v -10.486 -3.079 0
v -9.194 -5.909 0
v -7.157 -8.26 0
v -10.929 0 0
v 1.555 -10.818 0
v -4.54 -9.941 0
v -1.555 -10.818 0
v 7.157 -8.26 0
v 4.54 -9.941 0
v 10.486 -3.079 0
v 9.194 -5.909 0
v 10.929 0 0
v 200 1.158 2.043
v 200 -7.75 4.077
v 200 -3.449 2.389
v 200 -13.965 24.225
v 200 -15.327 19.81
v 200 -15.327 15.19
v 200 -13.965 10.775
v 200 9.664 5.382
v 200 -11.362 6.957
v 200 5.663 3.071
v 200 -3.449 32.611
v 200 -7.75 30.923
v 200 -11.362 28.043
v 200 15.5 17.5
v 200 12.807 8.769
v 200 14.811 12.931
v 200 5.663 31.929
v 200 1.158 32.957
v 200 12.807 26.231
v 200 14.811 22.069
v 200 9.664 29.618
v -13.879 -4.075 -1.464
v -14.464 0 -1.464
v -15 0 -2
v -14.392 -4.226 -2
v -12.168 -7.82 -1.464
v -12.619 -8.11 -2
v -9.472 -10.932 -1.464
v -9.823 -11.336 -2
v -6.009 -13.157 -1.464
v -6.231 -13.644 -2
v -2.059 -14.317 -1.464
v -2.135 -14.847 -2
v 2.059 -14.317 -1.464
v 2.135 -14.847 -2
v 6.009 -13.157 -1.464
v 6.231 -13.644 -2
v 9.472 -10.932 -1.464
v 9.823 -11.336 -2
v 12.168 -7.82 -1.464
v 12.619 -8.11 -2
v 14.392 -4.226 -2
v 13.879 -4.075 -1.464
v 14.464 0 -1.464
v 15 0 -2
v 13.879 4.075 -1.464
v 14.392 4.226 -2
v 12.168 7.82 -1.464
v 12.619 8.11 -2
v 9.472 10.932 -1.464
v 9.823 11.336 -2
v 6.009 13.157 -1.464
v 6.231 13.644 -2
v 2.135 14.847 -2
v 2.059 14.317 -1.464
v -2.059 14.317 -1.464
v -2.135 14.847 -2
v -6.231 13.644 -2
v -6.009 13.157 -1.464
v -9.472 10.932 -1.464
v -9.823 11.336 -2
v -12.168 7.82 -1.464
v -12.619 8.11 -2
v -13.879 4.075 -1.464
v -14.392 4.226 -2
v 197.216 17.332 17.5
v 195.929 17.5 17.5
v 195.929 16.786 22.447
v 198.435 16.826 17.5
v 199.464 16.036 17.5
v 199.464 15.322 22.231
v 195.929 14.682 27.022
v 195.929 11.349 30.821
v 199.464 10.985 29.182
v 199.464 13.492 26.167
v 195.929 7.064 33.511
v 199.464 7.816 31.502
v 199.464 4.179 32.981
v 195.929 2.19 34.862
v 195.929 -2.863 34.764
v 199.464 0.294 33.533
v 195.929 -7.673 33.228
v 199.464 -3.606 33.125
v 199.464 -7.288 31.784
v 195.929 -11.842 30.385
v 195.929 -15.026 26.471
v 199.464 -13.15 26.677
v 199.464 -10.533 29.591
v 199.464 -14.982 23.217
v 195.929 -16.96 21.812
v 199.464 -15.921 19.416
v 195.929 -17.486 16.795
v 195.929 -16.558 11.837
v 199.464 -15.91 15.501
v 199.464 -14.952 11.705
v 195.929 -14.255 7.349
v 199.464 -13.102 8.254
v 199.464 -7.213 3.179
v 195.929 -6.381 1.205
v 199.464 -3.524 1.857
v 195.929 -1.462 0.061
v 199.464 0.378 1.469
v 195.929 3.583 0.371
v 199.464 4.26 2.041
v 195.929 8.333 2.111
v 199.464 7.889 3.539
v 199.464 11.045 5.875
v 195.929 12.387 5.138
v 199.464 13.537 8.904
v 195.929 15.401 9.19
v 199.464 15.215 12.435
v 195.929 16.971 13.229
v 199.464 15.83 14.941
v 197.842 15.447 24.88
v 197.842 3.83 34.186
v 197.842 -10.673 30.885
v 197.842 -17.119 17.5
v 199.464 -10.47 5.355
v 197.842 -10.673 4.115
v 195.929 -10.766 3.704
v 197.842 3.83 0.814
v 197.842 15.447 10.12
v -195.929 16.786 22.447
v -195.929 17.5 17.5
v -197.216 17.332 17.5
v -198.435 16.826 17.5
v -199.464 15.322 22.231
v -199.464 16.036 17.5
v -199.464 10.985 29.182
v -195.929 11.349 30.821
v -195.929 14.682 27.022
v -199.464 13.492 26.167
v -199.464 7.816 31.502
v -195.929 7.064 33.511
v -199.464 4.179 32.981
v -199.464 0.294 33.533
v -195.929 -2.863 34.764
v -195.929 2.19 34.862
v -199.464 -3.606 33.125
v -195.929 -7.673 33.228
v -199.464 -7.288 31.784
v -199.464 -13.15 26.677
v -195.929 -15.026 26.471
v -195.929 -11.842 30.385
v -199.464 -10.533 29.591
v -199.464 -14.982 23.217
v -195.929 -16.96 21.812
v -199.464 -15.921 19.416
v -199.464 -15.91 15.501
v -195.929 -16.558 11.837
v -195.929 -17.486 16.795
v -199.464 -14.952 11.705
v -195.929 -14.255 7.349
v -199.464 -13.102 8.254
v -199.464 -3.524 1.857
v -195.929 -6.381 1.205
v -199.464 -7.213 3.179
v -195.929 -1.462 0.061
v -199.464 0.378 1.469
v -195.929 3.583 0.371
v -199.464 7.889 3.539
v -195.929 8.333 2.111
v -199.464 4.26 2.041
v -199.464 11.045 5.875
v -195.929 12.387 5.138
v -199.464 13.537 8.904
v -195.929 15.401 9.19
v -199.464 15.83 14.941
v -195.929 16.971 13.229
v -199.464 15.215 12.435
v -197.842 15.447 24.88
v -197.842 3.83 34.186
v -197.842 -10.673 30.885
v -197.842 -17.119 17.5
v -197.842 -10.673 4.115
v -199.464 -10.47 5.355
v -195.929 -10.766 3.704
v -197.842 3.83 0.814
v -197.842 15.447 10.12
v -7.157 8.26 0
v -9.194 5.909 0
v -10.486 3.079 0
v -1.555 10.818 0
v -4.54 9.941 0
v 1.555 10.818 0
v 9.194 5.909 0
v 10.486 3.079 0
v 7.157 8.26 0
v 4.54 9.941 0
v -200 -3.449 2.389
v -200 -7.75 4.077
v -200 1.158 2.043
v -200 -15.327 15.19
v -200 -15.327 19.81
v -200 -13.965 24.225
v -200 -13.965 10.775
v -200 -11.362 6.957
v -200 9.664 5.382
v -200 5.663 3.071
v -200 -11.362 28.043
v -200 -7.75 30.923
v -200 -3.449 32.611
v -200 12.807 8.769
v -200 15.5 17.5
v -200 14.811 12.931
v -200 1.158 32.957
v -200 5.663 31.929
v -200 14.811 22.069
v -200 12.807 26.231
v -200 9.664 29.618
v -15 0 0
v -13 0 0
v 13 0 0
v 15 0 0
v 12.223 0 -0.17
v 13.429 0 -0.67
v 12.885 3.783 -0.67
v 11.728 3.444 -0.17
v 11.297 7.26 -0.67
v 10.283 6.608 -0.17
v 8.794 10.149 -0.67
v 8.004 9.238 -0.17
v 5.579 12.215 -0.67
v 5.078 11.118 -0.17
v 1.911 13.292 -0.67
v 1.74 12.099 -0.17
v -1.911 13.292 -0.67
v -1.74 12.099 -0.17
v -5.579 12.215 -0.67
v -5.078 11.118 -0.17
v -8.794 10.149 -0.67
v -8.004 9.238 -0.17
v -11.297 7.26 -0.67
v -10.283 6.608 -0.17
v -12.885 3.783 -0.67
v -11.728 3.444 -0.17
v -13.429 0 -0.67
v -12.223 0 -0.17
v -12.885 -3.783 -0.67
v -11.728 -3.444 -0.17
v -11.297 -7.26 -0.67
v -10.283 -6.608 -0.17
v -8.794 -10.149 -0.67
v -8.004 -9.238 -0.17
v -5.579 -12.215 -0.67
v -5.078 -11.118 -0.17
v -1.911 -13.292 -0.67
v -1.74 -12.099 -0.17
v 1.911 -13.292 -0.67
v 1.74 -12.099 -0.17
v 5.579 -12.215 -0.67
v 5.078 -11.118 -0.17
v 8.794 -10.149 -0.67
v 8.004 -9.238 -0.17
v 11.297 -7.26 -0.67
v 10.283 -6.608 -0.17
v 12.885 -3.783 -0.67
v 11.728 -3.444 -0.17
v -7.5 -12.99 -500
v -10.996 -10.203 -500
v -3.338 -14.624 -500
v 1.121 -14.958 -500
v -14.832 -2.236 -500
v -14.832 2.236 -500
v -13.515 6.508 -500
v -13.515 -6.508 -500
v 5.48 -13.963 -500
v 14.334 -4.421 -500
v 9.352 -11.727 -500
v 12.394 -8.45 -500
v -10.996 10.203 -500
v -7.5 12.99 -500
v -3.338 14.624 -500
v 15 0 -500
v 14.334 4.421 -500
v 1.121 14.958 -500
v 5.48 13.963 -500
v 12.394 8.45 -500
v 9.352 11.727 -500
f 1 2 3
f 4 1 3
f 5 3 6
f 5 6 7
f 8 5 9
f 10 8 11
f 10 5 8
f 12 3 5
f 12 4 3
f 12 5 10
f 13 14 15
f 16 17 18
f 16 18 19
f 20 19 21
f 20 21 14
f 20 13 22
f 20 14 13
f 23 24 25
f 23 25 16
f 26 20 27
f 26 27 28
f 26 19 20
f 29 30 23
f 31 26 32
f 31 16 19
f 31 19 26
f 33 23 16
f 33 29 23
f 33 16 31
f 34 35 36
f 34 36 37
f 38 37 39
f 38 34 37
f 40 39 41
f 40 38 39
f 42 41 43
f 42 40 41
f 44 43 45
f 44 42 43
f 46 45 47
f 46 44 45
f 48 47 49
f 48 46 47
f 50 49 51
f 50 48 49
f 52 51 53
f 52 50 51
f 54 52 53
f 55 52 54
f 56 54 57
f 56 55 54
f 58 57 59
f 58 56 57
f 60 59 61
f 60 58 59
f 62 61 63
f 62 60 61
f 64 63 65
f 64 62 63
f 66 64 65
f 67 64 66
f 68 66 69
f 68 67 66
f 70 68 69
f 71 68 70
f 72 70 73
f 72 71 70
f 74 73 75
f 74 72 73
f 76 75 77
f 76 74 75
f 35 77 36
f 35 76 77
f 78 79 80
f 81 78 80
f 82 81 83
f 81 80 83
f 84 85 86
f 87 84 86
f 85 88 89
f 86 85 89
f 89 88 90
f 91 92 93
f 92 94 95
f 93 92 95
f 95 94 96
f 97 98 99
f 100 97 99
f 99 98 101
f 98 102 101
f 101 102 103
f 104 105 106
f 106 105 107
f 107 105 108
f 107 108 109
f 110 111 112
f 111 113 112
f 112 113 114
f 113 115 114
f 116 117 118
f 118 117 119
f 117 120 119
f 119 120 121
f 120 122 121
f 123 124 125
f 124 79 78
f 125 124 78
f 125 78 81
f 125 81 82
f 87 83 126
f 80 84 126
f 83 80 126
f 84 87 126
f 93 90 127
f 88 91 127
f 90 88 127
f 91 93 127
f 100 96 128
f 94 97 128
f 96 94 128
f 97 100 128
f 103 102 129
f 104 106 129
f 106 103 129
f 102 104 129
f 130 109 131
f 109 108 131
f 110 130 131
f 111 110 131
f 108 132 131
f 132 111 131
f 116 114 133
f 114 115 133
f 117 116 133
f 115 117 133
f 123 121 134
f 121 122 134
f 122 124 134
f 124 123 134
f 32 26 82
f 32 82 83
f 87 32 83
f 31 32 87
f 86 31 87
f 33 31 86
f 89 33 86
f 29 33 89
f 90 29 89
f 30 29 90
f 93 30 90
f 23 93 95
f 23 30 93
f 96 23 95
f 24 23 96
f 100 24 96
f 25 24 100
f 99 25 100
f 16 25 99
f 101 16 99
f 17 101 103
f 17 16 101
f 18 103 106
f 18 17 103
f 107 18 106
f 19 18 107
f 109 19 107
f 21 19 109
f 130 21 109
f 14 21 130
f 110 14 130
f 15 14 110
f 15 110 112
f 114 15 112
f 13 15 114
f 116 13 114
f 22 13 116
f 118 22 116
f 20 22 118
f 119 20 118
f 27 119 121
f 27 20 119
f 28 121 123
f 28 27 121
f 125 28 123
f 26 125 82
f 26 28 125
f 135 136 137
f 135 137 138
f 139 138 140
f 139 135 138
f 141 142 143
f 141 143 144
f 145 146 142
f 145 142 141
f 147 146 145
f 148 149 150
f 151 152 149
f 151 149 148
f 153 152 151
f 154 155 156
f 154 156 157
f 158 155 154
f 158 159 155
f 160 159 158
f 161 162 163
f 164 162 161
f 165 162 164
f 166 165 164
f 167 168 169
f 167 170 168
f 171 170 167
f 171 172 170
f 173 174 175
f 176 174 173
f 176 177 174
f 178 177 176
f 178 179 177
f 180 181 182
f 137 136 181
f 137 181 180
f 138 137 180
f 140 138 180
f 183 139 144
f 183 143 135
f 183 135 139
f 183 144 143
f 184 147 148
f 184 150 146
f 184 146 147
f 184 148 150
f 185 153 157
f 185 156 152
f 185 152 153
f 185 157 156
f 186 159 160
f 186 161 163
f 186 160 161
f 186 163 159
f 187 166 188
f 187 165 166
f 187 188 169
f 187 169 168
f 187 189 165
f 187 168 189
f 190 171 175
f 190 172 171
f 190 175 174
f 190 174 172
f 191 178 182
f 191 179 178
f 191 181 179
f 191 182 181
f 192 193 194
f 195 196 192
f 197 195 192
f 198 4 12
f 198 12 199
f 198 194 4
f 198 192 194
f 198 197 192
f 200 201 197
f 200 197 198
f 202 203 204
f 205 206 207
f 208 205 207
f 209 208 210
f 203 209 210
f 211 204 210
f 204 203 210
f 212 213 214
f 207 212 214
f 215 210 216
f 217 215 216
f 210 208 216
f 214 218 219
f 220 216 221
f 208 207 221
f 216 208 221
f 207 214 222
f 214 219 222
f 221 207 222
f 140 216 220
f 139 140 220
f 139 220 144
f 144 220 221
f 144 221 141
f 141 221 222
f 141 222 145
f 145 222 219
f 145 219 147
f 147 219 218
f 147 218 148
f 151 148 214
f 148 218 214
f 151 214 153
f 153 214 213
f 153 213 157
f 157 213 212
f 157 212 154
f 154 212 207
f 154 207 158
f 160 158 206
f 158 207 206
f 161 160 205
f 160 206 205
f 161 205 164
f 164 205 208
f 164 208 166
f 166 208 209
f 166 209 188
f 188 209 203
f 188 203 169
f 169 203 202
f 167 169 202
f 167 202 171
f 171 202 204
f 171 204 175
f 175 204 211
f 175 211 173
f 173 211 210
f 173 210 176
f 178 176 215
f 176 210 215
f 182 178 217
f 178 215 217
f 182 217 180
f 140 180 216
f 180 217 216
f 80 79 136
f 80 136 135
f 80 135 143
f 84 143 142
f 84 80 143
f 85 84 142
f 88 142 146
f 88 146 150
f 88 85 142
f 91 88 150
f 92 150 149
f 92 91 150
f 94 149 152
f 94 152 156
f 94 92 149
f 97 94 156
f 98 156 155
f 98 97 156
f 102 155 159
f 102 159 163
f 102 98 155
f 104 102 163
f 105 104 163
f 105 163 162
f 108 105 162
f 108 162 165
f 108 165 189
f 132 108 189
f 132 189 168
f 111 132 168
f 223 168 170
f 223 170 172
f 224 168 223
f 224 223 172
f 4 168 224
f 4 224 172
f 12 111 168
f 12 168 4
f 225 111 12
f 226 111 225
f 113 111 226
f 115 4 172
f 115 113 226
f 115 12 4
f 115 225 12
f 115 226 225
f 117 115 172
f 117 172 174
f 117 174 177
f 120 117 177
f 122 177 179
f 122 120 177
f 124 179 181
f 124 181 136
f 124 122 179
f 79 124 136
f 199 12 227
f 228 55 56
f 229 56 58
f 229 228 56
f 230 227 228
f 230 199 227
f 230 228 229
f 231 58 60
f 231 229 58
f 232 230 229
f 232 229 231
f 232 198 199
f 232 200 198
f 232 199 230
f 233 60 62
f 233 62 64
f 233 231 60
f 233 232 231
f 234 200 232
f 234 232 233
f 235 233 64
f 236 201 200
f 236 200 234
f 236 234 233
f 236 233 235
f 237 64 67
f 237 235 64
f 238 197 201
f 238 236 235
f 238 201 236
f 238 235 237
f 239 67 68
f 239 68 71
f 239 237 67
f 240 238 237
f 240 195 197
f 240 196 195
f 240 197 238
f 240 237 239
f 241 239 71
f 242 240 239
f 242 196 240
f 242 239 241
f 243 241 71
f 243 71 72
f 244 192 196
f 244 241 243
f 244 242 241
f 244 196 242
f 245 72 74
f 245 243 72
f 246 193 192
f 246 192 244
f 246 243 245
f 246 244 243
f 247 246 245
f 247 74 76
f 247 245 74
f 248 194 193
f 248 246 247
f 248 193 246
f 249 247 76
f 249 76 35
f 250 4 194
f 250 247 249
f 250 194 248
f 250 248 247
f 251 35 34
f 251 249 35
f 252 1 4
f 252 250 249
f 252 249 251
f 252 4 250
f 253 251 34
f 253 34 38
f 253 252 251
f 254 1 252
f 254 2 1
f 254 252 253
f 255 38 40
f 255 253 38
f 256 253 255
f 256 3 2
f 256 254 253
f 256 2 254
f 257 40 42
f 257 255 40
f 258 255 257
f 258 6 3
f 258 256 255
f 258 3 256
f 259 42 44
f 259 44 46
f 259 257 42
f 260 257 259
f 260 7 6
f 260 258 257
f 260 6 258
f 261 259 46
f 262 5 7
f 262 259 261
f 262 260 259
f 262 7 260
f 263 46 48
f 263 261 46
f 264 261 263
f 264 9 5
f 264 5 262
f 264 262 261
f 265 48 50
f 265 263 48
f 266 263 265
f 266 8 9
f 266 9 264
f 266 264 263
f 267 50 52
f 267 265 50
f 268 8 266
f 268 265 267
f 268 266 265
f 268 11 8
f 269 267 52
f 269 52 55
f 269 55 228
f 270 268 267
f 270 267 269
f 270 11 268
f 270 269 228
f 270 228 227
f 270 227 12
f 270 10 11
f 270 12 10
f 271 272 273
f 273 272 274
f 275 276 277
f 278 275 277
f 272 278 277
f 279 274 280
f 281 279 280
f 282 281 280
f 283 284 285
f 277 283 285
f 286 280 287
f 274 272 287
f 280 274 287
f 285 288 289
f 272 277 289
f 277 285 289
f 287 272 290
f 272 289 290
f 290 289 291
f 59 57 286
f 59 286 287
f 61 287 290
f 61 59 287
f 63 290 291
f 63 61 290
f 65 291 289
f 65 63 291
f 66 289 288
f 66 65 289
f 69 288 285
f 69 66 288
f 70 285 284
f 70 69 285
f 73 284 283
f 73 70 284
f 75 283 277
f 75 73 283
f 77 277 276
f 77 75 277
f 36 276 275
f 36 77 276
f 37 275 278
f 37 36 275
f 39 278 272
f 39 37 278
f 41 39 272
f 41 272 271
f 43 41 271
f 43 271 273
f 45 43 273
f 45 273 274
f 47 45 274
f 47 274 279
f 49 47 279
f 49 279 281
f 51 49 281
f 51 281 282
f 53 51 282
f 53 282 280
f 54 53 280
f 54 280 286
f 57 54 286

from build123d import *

# Parameters (mm, degrees)
F0_R           = 15
F1_DEPTH       = 500
F2_R           = 17.5
F3_DEPTH       = 200
F4_T2_ANGLE    = 180
F4_T4_ANGLE    = 180
F4_S1_C1_SIZE  = 2
F4_S1_C2_SIZE  = 2
F5_F1_R        = 5
F5_F2_R        = 5
F5_S1_T2_ANGLE = 180
F5_S1_T4_ANGLE = 180


# Not quite as in the source:
# - a fillet or chamfer that OpenCascade refuses, or shapes differently, is made with other operations: its cross-section is extruded or revolved along the edge and cut away or added


with BuildPart() as f1:
    # F0 (on Top) → F1 (new body)
    with BuildSketch(Plane.XY):
        Circle(F0_R)
    extrude(amount=-F1_DEPTH)

    # F2 (on Right) → F3 (join, symmetric)
    with BuildSketch(Plane.YZ):
        with Locations((0, 17.5)):
            Circle(F2_R)
    extrude(amount=F3_DEPTH, both=True)

    # F4: chamfer of 2 on 3 edges, made by hand

    # F4_s1 → F4_t2 (revolve, cut)
    with BuildSketch(Plane.XZ):
        Polygon((15, -2), (13, 0), (15, 0), align=None)
    revolve(axis=Axis((0, 0, 0), (0, 0, 1)), revolution_arc=F4_T2_ANGLE, mode=Mode.SUBTRACT)

    # F4_s3 → F4_t4 (revolve, cut)
    with BuildSketch(Plane.XZ):
        Polygon((-15, -2), (-13, 0), (-15, 0), align=None)
    revolve(axis=Axis((0, 0, 0), (0, 0, 1)), revolution_arc=F4_T4_ANGLE, mode=Mode.SUBTRACT)

    # F4#s1: chamfer of 2 on 3 edges, made by hand

    # F4_s1_c1
    f4_s1_c1_edges = [f1.edges().sort_by_distance(p)[0] for p in [
        (200, -17.5, 17.5),
    ]]
    chamfer(f4_s1_c1_edges, length=F4_S1_C1_SIZE)

    # F4_s1_c2
    f4_s1_c2_edges = [f1.edges().sort_by_distance(p)[0] for p in [
        (-200, -17.5, 17.5),
    ]]
    chamfer(f4_s1_c2_edges, length=F4_S1_C2_SIZE)

    # F5: fillet of radius 5 on 6 edges, made by hand

    # F5_f1
    f5_f1_edges = [f1.edges().sort_by_distance(p)[0] for p in [
        (-198, -17.5, 17.5),
    ]]
    fillet(f5_f1_edges, radius=F5_F1_R)

    # F5_f2
    f5_f2_edges = [f1.edges().sort_by_distance(p)[0] for p in [
        (198, -17.5, 17.5),
    ]]
    fillet(f5_f2_edges, radius=F5_F2_R)

    # F5#s1: fillet of radius 5 on 2 edges, made by hand

    # F5_s1_s1 → F5_s1_t2 (revolve, cut)
    with BuildSketch(Plane.XZ):
        with BuildLine():
            ThreePointArc((-14.4644660941, -1.4644660941), (-12.84234935, -0.3806023374), (-10.9289321881, 0))
            Line((-10.9289321881, 0), (-13, 0))
            Line((-13, 0), (-14.4644660941, -1.4644660941))
        make_face()
    revolve(axis=Axis((0, 0, 0), (0, 0, 1)), revolution_arc=F5_S1_T2_ANGLE, mode=Mode.SUBTRACT)

    # F5_s1_s3 → F5_s1_t4 (revolve, cut)
    with BuildSketch(Plane.XZ):
        with BuildLine():
            ThreePointArc((14.4644660941, -1.4644660941), (12.84234935, -0.3806023374), (10.9289321881, 0))
            Line((10.9289321881, 0), (13, 0))
            Line((13, 0), (14.4644660941, -1.4644660941))
        make_face()
    revolve(axis=Axis((0, 0, 0), (0, 0, 1)), revolution_arc=F5_S1_T4_ANGLE, mode=Mode.SUBTRACT)


solid = f1.part
